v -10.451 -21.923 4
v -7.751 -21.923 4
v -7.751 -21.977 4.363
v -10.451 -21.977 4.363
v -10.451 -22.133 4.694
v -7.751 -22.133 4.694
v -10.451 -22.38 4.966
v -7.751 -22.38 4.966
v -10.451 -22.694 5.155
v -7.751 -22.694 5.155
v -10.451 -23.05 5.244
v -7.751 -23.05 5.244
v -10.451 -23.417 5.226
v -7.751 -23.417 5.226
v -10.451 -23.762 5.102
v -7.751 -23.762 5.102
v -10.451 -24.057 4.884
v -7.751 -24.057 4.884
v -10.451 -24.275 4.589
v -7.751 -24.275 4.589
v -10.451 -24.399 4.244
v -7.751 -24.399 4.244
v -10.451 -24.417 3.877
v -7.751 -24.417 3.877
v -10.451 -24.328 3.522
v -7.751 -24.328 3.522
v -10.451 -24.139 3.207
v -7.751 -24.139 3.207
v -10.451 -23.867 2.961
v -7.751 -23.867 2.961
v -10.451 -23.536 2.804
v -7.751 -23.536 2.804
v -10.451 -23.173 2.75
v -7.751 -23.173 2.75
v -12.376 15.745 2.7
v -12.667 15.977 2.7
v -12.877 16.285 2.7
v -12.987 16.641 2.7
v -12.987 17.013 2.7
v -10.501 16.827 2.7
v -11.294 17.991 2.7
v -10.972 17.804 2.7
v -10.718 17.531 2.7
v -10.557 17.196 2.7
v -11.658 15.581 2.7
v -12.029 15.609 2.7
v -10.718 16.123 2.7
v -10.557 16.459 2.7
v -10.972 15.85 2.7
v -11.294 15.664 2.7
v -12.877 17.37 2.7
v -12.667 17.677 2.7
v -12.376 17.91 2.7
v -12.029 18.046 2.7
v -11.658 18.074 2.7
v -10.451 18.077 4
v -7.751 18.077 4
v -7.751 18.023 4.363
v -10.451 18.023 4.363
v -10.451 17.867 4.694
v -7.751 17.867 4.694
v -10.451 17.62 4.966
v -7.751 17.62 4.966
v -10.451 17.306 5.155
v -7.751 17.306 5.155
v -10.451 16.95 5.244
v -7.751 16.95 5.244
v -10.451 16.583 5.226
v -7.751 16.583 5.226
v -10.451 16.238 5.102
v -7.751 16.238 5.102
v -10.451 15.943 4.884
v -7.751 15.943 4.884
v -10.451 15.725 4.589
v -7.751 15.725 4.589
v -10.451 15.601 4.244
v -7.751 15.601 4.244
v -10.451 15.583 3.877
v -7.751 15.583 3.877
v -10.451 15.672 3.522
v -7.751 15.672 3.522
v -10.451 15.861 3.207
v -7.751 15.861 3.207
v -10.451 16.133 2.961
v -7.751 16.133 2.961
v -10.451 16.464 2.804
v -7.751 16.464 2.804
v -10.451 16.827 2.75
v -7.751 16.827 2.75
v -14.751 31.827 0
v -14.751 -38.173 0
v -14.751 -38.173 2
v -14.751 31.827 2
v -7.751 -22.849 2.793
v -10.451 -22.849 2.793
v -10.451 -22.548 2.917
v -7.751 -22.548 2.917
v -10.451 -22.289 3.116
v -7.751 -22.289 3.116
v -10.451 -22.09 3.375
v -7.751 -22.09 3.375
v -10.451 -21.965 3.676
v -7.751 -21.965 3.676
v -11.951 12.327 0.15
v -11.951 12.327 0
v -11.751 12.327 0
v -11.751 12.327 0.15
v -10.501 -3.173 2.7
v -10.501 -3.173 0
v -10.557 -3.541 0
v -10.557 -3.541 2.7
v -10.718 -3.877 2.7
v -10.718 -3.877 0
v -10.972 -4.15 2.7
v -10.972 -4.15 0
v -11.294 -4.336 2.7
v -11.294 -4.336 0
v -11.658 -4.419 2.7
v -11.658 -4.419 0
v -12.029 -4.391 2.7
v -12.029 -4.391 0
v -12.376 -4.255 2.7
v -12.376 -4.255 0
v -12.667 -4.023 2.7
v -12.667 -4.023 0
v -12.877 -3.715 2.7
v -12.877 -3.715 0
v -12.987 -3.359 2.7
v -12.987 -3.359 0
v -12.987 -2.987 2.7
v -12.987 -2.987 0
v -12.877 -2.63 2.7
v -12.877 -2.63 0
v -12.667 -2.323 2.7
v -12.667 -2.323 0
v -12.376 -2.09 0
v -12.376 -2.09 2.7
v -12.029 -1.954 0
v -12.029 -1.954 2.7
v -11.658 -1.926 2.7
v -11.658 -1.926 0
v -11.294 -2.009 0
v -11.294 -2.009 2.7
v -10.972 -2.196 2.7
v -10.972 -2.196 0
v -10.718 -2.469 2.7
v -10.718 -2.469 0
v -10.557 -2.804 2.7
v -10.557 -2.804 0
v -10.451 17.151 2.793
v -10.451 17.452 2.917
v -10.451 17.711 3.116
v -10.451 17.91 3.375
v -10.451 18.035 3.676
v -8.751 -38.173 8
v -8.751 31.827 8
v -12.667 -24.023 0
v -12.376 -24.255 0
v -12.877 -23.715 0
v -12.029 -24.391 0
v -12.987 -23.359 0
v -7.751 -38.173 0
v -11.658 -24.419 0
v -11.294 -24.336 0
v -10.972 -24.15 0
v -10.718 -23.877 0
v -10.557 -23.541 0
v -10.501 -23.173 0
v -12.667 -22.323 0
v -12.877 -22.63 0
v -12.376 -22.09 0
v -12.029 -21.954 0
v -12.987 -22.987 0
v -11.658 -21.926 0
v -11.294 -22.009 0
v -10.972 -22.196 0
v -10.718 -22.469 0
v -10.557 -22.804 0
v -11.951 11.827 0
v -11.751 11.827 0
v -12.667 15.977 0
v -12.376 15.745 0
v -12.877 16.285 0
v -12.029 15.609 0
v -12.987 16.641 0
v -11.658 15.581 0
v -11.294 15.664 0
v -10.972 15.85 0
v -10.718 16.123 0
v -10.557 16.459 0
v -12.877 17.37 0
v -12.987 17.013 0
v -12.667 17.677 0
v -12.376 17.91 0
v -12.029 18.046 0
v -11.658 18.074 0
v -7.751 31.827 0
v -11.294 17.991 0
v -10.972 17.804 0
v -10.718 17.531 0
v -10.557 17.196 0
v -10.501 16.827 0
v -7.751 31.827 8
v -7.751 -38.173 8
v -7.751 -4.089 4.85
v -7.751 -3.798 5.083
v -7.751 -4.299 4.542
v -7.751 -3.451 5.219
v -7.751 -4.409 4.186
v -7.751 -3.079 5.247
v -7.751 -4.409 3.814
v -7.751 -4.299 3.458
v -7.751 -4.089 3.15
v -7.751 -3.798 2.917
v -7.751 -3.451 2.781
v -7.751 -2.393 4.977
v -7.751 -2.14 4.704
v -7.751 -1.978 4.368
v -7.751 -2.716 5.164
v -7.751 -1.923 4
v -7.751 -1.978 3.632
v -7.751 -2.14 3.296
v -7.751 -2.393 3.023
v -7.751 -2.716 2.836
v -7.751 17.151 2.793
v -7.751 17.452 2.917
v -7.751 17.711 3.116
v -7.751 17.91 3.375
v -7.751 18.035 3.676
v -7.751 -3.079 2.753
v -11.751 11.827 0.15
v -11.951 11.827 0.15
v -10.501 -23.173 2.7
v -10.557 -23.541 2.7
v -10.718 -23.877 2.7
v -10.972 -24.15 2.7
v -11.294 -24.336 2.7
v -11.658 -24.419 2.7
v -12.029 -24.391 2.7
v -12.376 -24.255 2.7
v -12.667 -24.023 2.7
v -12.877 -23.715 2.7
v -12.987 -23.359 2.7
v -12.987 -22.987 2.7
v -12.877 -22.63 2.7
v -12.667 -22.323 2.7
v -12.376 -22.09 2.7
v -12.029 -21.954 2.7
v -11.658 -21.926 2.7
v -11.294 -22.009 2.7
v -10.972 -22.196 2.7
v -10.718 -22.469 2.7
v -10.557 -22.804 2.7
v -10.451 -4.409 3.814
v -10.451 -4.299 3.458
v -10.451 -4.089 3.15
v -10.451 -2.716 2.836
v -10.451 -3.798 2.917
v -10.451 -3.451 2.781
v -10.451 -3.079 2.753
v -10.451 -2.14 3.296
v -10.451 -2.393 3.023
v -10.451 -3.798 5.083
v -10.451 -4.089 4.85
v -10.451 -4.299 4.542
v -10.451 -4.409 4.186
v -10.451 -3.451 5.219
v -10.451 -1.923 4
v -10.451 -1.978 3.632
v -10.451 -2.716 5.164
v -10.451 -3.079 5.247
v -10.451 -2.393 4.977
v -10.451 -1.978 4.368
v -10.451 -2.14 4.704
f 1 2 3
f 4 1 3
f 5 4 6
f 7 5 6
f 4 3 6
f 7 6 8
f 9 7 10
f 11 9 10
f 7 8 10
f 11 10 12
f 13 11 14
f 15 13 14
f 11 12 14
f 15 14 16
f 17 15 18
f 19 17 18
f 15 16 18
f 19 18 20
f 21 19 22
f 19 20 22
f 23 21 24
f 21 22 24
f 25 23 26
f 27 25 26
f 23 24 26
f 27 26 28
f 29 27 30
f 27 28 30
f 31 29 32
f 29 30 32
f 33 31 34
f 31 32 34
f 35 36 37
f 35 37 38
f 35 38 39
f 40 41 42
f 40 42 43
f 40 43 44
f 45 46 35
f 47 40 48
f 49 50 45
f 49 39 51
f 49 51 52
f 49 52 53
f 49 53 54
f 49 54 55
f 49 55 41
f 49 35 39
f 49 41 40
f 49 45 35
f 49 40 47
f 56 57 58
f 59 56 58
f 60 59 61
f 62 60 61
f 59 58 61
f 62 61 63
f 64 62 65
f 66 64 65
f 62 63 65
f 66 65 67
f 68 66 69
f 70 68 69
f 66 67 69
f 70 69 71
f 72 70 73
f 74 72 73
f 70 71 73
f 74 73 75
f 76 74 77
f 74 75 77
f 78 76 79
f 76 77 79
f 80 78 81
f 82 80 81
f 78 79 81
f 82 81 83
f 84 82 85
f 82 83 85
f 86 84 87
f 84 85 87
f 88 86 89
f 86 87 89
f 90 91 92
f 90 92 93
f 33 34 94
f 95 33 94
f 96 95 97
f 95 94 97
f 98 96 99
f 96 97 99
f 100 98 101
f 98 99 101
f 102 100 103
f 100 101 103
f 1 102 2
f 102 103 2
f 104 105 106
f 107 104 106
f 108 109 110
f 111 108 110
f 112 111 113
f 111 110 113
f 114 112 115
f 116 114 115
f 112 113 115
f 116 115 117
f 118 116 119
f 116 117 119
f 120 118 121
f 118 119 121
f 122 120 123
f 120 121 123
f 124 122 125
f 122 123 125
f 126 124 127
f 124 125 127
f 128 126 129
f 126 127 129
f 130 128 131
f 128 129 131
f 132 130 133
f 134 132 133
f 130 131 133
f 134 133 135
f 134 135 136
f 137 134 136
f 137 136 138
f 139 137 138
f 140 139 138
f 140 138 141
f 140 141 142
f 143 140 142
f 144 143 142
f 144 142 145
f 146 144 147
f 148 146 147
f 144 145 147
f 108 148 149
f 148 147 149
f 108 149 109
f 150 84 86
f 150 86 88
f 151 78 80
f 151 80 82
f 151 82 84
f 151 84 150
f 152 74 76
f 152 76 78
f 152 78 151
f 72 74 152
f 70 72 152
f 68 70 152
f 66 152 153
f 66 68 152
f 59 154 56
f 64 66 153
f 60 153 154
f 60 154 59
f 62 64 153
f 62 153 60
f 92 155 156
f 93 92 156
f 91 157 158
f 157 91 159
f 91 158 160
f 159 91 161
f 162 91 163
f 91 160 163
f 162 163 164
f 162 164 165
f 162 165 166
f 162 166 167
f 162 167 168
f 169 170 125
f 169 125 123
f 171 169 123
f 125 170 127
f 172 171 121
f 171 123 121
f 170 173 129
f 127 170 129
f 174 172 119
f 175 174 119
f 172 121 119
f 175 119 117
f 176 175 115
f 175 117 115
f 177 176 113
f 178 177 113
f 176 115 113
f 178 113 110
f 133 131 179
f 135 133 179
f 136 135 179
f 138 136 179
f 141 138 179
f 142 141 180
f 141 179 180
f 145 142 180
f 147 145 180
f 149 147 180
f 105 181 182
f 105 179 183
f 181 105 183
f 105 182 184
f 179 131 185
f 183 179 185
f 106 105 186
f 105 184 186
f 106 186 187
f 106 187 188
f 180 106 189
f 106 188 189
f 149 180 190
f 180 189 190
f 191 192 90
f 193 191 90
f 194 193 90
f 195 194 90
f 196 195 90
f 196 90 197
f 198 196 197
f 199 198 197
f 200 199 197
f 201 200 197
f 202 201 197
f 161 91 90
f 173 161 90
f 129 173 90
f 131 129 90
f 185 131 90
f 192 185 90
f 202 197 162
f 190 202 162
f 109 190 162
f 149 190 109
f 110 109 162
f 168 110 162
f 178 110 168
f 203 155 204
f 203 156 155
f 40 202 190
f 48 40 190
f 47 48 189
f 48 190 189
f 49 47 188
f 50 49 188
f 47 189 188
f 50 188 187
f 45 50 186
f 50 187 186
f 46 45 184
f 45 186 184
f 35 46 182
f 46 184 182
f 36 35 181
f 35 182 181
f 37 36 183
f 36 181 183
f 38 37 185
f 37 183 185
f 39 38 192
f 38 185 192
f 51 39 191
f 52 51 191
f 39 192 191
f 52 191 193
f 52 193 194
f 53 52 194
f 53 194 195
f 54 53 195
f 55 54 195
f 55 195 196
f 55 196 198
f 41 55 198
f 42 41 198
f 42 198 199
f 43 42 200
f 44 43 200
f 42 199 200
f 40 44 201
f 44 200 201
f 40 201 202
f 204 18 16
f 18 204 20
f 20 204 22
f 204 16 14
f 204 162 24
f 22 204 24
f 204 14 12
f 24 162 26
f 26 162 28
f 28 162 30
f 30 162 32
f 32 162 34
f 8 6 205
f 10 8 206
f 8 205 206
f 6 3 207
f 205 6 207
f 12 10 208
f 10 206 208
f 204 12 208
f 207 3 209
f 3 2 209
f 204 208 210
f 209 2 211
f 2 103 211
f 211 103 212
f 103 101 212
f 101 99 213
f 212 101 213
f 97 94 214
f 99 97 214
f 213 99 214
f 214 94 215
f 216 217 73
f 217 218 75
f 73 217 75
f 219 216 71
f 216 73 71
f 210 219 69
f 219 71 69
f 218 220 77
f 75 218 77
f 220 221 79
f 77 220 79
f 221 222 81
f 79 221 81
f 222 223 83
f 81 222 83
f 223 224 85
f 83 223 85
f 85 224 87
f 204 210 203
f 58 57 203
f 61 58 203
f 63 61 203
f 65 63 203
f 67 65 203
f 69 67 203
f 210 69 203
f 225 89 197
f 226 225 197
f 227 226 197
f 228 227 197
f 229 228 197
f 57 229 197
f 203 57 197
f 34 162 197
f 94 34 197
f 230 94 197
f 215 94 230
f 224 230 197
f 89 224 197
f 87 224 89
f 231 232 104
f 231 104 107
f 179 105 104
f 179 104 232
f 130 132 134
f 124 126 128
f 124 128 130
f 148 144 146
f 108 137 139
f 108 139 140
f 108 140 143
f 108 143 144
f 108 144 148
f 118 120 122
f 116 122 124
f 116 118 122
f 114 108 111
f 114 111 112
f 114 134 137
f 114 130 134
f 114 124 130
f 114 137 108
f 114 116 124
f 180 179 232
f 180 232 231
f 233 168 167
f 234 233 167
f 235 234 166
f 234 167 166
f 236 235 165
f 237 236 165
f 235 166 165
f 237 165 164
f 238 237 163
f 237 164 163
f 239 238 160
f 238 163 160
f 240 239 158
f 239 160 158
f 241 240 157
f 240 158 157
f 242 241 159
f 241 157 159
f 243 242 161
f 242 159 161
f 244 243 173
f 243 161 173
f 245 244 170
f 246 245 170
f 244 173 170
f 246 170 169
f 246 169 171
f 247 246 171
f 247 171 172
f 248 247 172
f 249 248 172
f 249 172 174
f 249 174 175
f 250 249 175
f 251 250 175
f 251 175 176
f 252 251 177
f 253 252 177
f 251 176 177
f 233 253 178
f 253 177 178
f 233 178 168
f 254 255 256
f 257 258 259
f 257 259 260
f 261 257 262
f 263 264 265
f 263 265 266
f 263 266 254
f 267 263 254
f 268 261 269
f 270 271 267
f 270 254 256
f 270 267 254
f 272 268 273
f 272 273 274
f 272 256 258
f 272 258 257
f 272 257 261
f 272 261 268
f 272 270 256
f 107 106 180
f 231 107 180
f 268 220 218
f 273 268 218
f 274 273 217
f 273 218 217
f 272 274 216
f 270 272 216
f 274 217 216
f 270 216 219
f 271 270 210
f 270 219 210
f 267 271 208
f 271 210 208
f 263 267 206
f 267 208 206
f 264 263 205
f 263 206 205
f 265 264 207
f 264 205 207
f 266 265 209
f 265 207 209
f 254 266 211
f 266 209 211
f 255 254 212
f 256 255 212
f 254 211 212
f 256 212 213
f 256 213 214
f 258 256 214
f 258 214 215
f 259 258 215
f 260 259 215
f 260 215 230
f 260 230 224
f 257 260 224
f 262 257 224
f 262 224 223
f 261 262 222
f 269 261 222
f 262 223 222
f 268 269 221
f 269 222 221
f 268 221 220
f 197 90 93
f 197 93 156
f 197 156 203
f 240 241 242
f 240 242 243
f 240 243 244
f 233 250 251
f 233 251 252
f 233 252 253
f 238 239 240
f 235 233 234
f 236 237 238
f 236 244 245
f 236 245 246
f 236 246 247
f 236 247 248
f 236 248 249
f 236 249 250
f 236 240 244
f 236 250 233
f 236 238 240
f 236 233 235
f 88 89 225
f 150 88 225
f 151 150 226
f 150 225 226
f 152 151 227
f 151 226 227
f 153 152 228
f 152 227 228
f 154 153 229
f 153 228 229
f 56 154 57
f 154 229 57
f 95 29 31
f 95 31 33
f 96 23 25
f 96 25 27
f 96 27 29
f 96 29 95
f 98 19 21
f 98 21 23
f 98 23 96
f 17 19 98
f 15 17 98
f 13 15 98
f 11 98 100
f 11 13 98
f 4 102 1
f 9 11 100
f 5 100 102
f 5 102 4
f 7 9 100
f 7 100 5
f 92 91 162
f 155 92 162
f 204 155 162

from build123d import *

# Parameters (mm, degrees)
F0_W     = 7
F0_H     = 70
F1_DEPTH = 8
F2_SIZE  = 6
F3_R     = 1.25
F4_DEPTH = 2.7
F5_R     = 1.25
F6_DEPTH = 2.7
F5_W     = 0.2
F5_H     = 0.5
F7_DEPTH = 0.15


with BuildPart() as f1:
    # F0 (on Top) → F1 (new body)
    with BuildSketch(Plane.XY):
        with Locations((-11.251043, -3.17281)):
            Rectangle(F0_W, F0_H)
    extrude(amount=F1_DEPTH)

    # F2
    f2_edges = [f1.edges().sort_by_distance(p)[0] for p in [
        (-14.751043, -3.17281, 8),
    ]]
    chamfer(f2_edges, length=F2_SIZE)

    # F3 (on face) → F4 (cut)
    with BuildSketch(Plane.YZ.offset(-7.751043)):
        with BuildLine():
            ThreePointArc((-23.17281, 2.75), (-22.288927, 3.116117), (-21.92281, 4))
            ThreePointArc((-21.92281, 4), (-24.056694, 4.883883), (-23.17281, 2.75))
        make_face()
        with Locations((-3.17281, 4)):
            Circle(F3_R)
        with BuildLine():
            ThreePointArc((16.82719, 2.75), (17.711073, 3.116117), (18.07719, 4))
            ThreePointArc((18.07719, 4), (15.943306, 4.883883), (16.82719, 2.75))
        make_face()
    extrude(amount=-F4_DEPTH, mode=Mode.SUBTRACT)

    # F5 (on face) → F6 (cut)
    with BuildSketch(Plane(origin=(0, 0, 0), x_dir=(1, 0, 0), z_dir=(0, 0, -1))):
        with Locations((-11.751043, -16.82719)):
            Circle(F5_R)
        with Locations((-11.751043, 3.17281)):
            Circle(F5_R)
        with Locations((-11.751043, 23.17281)):
            Circle(F5_R)
    extrude(amount=-F6_DEPTH, mode=Mode.SUBTRACT)

    # F5 (on face) → F7 (cut)
    with BuildSketch(Plane(origin=(0, 0, 0), x_dir=(1, 0, 0), z_dir=(0, 0, -1))):
        with Locations((-11.851043, -12.07719)):
            Rectangle(F5_W, F5_H)
    extrude(amount=-F7_DEPTH, mode=Mode.SUBTRACT)


solid = f1.part
